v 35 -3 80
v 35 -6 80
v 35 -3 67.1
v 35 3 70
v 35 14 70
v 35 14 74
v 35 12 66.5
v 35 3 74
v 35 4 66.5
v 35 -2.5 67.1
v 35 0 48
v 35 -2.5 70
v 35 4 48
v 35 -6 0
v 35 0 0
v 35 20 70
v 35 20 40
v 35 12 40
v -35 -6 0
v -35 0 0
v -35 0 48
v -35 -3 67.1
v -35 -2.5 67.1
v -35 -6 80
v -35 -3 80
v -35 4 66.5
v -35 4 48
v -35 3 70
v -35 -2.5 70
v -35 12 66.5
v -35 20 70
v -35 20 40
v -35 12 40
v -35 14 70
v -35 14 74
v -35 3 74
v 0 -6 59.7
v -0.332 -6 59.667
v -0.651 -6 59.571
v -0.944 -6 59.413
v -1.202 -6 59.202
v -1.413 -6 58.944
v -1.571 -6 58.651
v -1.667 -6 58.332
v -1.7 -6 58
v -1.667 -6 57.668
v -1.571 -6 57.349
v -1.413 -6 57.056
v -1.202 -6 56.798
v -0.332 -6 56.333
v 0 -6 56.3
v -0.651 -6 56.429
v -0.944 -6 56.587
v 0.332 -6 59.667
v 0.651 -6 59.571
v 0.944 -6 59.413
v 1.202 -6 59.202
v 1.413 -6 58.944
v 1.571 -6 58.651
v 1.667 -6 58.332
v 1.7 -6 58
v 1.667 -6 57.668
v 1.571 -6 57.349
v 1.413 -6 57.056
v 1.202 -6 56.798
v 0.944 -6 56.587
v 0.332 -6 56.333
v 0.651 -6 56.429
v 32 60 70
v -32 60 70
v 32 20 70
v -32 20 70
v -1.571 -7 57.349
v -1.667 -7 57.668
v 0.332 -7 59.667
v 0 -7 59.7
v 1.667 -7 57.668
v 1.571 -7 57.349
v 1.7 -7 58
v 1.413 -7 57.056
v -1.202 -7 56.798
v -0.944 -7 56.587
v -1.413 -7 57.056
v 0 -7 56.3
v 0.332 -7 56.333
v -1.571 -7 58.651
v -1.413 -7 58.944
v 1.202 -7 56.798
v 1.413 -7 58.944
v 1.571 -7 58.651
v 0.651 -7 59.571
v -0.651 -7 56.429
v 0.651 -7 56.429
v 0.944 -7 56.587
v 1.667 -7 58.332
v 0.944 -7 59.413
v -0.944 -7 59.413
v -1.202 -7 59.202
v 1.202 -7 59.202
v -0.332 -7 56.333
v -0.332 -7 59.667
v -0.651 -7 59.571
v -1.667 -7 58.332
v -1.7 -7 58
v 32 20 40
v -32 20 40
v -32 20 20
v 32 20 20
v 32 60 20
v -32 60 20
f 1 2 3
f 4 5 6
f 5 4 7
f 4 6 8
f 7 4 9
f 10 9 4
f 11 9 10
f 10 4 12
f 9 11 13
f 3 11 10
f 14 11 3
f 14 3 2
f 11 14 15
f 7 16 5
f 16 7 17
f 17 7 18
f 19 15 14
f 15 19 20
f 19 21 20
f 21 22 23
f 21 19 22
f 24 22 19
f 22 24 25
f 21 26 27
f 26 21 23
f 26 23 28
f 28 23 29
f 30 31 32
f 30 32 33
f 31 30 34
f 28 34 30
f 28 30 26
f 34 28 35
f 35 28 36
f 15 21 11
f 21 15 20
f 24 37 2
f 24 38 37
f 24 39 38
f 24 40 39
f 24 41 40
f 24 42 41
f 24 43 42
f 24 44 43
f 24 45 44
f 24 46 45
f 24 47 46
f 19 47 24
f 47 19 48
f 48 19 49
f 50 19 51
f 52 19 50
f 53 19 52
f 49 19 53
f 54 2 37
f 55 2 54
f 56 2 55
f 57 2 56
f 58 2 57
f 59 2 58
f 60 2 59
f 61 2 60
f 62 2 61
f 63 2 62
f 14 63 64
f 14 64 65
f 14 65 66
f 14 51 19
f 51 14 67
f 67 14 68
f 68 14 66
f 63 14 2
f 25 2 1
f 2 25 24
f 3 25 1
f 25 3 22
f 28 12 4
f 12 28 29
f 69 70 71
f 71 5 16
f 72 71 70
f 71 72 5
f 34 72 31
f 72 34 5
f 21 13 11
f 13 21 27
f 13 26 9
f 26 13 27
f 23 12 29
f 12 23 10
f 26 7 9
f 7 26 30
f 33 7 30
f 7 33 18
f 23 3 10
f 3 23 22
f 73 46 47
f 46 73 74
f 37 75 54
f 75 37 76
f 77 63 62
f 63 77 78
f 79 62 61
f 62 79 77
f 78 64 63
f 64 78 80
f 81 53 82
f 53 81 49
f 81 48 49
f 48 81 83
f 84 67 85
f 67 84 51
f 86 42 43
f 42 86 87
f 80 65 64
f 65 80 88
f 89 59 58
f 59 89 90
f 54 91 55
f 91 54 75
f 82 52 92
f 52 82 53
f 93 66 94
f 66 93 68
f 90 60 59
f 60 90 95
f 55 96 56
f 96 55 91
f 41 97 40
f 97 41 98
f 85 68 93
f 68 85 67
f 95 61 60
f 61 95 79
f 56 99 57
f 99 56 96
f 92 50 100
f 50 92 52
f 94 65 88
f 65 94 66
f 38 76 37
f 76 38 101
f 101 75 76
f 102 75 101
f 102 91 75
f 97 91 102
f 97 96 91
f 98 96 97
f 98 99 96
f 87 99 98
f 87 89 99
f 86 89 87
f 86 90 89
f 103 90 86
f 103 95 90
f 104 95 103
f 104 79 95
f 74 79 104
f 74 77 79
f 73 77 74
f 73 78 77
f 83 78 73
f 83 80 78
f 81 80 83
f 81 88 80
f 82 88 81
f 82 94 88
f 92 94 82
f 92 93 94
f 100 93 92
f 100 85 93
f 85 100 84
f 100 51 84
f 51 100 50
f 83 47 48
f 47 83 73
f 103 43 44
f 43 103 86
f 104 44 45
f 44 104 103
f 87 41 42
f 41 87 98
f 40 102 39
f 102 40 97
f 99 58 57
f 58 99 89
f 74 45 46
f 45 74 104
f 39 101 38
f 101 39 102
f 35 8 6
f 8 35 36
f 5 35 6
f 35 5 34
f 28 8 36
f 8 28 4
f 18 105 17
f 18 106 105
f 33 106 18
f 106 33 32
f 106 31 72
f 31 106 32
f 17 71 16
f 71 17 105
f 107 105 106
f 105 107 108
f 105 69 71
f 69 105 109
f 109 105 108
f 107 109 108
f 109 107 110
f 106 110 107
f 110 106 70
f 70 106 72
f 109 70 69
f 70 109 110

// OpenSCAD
// ======================================================================
// assembly_explainer.scad -- NUR Veranschaulichung, kein Druckteil.
// Zeigt: Profil bleibt FEST im Koffer, der Rahmen (Bracket+Module) liegt
// nur auf und wird komplett nach oben herausgehoben. KEIN Fang, kein Riegel.
// explode=1 hebt den Rahmen heraus, damit die Trennung sichtbar ist.
// ======================================================================
$fn = 32;
explode = 0;      // 0 = eingesetzt, 1 = Rahmen herausgehoben
L = 70;
lift = explode * 55;   // wie weit der Rahmen angehoben gezeigt wird

// ---- KOFFERWAND + Kante (FEST) ----
color("#bdbbb4") {
    translate([-L/2, -6, 0]) cube([L, 6, 67]);       // untere Wand
    translate([-L/2, -6, 67]) cube([L, 3, 13]);      // obere Wand (Stufe=Kante bei 67)
}
color("#c0435a") translate([-L/2, -3, 66.6]) cube([L, 3, 0.5]);  // Kante markiert

// ---- PROFIL (FEST im Koffer: Auflage-Schiene) ----
color("#3d7ea6") {
    translate([-L/2, 0, 48]) cube([L, 4, 22]);          // Rueckwand
    translate([-L/2, -2.5, 63.5]) cube([L, 6.5, 6.5]);  // Nase auf der Kante
    translate([-L/2, 4, 66.5]) cube([L, 8, 3.5]);       // Auflage (Oberkante z=70)
}
color("#333") translate([0, -7, 58]) rotate([-90,0,0]) cylinder(d=3.4, h=6);  // Schraube-Andeutung

// ---- RAHMEN (ENTNEHMBAR: Bracket + Flansch + Module) ----
color("#7ec4e8") translate([-L/2, 3, 70 + lift]) cube([L, 11, 4]);   // Auflage-Flansch
color("#6a6a6a") translate([-L/2, 12, 40 + lift]) cube([L, 8, 30]);  // Bracket
color("#e6cfa8") translate([-L/2+3, 20, 20 + lift]) cube([L-6, 40, 50]); // Module

// ---- Pfeil "herausheben" ----
if (explode == 1)
    color("#2e7d32") {
        translate([0, 20, 74]) cylinder(d=4, h=42);
        translate([0, 20, 116]) cylinder(d1=9, d2=0, h=9);
    }
